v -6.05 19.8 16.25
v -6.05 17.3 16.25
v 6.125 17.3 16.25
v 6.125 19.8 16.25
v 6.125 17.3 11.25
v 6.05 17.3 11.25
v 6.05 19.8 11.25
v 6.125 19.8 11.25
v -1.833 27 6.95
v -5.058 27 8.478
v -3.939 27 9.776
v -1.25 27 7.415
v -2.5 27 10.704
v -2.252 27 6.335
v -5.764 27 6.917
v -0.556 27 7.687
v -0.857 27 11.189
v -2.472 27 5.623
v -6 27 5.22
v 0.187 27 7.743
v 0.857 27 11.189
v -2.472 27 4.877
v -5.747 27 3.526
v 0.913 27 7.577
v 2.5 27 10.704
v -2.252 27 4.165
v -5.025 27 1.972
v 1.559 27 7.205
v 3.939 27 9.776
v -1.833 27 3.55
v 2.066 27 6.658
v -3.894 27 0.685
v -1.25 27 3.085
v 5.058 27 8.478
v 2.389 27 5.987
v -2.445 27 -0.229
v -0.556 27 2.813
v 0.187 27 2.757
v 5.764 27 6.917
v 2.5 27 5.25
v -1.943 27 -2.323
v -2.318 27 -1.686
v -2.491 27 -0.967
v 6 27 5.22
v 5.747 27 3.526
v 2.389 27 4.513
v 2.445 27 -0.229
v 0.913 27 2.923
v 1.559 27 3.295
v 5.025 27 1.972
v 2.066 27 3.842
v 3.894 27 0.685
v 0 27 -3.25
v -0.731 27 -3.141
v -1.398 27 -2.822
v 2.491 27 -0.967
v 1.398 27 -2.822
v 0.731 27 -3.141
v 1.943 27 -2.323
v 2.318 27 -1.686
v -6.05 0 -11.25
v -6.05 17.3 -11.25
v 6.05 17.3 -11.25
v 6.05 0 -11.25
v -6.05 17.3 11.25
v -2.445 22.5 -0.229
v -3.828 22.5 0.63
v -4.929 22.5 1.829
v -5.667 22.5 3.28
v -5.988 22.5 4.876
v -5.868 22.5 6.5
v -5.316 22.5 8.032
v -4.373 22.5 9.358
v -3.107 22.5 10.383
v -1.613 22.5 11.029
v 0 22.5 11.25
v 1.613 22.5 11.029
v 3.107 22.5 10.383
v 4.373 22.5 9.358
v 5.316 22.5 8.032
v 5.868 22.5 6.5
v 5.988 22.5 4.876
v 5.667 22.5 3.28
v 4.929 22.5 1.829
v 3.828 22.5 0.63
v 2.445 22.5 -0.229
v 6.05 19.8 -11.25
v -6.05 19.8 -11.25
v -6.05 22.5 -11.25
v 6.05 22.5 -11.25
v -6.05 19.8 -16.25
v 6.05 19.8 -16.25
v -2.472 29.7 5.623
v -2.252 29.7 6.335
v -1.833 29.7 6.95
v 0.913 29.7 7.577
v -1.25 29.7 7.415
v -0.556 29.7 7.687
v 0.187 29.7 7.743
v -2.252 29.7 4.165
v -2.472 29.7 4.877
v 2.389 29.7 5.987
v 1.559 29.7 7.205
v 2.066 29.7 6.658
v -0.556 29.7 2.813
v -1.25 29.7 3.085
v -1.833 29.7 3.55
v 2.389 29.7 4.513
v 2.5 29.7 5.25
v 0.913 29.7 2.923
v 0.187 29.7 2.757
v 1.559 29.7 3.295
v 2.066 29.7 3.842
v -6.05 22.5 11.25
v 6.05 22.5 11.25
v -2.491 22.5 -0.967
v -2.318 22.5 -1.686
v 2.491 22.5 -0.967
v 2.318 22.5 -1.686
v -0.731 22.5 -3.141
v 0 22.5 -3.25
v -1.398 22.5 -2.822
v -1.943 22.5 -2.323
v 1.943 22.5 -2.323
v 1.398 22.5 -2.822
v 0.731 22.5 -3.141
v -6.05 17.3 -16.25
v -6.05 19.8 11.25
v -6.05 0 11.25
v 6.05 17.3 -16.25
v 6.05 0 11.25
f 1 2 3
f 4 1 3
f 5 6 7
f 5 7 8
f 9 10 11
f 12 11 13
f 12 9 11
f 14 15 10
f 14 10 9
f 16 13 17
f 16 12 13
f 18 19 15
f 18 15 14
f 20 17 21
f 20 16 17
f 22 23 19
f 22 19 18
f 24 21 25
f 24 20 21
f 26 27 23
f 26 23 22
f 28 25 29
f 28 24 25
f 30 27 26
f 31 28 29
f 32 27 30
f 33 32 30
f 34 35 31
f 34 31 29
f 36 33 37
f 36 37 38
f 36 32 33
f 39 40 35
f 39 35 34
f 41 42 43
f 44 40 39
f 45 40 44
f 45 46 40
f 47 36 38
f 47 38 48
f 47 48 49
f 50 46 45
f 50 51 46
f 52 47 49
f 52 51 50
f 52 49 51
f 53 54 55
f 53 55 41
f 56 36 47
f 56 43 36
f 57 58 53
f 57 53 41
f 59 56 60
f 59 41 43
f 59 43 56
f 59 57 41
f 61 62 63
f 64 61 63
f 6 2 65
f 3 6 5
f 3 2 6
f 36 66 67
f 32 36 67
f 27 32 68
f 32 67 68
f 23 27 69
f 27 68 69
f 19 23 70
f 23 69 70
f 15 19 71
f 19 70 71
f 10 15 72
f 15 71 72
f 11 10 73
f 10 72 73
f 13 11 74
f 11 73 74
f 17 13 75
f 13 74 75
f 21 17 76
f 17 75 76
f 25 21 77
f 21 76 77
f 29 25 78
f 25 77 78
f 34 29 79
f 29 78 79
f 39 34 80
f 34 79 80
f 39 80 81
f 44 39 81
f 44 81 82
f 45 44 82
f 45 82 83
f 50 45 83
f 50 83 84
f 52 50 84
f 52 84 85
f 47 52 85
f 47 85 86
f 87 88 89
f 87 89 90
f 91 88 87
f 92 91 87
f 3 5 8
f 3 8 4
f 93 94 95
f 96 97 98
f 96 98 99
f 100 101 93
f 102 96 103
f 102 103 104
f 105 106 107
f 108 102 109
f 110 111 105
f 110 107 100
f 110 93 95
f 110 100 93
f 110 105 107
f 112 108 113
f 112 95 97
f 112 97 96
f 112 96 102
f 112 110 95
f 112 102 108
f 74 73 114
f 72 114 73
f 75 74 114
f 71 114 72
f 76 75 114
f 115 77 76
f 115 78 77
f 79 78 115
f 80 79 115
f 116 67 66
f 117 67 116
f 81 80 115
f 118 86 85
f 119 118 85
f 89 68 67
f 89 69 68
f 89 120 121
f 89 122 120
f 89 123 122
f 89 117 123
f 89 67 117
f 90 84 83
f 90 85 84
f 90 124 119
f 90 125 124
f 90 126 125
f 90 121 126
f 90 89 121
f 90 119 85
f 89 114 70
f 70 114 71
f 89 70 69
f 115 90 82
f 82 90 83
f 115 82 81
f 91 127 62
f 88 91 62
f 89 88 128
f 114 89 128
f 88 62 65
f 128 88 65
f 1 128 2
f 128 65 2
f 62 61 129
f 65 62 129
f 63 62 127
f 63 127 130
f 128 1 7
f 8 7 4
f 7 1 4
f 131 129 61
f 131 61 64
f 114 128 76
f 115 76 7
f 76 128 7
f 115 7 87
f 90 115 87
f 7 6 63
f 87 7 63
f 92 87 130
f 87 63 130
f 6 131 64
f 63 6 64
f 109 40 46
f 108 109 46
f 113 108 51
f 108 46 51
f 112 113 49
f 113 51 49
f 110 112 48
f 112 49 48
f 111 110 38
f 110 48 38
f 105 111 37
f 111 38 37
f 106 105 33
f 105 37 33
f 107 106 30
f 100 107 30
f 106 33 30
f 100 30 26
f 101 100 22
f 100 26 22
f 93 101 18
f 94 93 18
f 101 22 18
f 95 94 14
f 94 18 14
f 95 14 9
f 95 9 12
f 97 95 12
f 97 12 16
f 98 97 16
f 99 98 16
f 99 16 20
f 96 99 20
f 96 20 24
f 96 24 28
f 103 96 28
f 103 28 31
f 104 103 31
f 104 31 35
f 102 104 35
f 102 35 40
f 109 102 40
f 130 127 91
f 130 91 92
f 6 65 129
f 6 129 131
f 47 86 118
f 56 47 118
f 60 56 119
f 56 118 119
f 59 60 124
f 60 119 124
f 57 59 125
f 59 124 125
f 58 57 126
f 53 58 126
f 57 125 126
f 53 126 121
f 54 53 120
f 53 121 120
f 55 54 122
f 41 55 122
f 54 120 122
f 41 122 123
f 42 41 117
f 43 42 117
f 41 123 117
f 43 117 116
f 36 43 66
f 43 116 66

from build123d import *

# Parameters (mm, degrees)
SKETCH1_W           = 12.1
SKETCH1_H           = 22.5
BOSS_EXTRUDE1_DEPTH = 22.5
BOSS_EXTRUDE2_DEPTH = 4.5
SKETCH2_3_R         = 2.5
BOSS_EXTRUDE3_DEPTH = 7.2
SKETCH9_R           = 1.27
BOSS_EXTRUDE7_DEPTH = 3
SKETCH12_W          = 12.175
SKETCH12_H          = 5
SKETCH12_W_2        = 12.1
BOSS_EXTRUDE8_DEPTH = 19.8
SKETCH12_2_W        = 12.175
SKETCH12_2_H        = 5
SKETCH12_2_W_2      = 12.1
CUT_EXTRUDE1_DEPTH  = 17.3


with BuildPart() as part:
    # Sketch1 → Boss-Extrude1 (new body)
    with BuildSketch(Plane(origin=(0, 0, 0), x_dir=(1, 0, 0), z_dir=(0, 1, 0))):
        Rectangle(SKETCH1_W, SKETCH1_H)
    extrude(amount=BOSS_EXTRUDE1_DEPTH)

    # Sketch2 → Boss-Extrude2 (add)
    with BuildSketch(Plane(origin=(0, 22.5, 0), x_dir=(1, 0, 0), z_dir=(0, 1, 0))):
        with BuildLine():
            ThreePointArc((-2.445144707, 0.229166667), (0, -11.25), (2.445144707, 0.229166667))
            ThreePointArc((2.445144707, 0.229166667), (0, 3.25), (-2.445144707, 0.229166667))
        make_face()
    extrude(amount=BOSS_EXTRUDE2_DEPTH)

    # Sketch2<3> → Boss-Extrude3 (add)
    with BuildSketch(Plane(origin=(0, 22.5, 0), x_dir=(1, 0, 0), z_dir=(0, 1, 0))):
        with Locations((0, -5.25)):
            Circle(SKETCH2_3_R)
    extrude(amount=BOSS_EXTRUDE3_DEPTH)

    # Sketch9 → Boss-Extrude7 (add)
    with BuildSketch(Plane.XY.offset(11.25)):
        with Locations((0, 1.27)):
            Circle(SKETCH9_R)
        with Locations((-2.6, 1.27)):
            Circle(SKETCH9_R)
        with Locations((2.6, 1.27)):
            Circle(SKETCH9_R)
    extrude(amount=BOSS_EXTRUDE7_DEPTH)

    # Sketch12 → Boss-Extrude8 (add)
    with BuildSketch(Plane.XZ):
        with Locations((0.0375, 13.75)):
            Rectangle(SKETCH12_W, SKETCH12_H)
        with Locations((0, -13.75)):
            Rectangle(SKETCH12_W_2, SKETCH12_H)
    extrude(amount=-BOSS_EXTRUDE8_DEPTH)

    # Sketch12<2> → Cut-Extrude1 (cut)
    with BuildSketch(Plane.XZ):
        with Locations((0.0375, 13.75)):
            Rectangle(SKETCH12_2_W, SKETCH12_2_H)
        with Locations((0, -13.75)):
            Rectangle(SKETCH12_2_W_2, SKETCH12_2_H)
    extrude(amount=-CUT_EXTRUDE1_DEPTH, mode=Mode.SUBTRACT)


solid = part.part
